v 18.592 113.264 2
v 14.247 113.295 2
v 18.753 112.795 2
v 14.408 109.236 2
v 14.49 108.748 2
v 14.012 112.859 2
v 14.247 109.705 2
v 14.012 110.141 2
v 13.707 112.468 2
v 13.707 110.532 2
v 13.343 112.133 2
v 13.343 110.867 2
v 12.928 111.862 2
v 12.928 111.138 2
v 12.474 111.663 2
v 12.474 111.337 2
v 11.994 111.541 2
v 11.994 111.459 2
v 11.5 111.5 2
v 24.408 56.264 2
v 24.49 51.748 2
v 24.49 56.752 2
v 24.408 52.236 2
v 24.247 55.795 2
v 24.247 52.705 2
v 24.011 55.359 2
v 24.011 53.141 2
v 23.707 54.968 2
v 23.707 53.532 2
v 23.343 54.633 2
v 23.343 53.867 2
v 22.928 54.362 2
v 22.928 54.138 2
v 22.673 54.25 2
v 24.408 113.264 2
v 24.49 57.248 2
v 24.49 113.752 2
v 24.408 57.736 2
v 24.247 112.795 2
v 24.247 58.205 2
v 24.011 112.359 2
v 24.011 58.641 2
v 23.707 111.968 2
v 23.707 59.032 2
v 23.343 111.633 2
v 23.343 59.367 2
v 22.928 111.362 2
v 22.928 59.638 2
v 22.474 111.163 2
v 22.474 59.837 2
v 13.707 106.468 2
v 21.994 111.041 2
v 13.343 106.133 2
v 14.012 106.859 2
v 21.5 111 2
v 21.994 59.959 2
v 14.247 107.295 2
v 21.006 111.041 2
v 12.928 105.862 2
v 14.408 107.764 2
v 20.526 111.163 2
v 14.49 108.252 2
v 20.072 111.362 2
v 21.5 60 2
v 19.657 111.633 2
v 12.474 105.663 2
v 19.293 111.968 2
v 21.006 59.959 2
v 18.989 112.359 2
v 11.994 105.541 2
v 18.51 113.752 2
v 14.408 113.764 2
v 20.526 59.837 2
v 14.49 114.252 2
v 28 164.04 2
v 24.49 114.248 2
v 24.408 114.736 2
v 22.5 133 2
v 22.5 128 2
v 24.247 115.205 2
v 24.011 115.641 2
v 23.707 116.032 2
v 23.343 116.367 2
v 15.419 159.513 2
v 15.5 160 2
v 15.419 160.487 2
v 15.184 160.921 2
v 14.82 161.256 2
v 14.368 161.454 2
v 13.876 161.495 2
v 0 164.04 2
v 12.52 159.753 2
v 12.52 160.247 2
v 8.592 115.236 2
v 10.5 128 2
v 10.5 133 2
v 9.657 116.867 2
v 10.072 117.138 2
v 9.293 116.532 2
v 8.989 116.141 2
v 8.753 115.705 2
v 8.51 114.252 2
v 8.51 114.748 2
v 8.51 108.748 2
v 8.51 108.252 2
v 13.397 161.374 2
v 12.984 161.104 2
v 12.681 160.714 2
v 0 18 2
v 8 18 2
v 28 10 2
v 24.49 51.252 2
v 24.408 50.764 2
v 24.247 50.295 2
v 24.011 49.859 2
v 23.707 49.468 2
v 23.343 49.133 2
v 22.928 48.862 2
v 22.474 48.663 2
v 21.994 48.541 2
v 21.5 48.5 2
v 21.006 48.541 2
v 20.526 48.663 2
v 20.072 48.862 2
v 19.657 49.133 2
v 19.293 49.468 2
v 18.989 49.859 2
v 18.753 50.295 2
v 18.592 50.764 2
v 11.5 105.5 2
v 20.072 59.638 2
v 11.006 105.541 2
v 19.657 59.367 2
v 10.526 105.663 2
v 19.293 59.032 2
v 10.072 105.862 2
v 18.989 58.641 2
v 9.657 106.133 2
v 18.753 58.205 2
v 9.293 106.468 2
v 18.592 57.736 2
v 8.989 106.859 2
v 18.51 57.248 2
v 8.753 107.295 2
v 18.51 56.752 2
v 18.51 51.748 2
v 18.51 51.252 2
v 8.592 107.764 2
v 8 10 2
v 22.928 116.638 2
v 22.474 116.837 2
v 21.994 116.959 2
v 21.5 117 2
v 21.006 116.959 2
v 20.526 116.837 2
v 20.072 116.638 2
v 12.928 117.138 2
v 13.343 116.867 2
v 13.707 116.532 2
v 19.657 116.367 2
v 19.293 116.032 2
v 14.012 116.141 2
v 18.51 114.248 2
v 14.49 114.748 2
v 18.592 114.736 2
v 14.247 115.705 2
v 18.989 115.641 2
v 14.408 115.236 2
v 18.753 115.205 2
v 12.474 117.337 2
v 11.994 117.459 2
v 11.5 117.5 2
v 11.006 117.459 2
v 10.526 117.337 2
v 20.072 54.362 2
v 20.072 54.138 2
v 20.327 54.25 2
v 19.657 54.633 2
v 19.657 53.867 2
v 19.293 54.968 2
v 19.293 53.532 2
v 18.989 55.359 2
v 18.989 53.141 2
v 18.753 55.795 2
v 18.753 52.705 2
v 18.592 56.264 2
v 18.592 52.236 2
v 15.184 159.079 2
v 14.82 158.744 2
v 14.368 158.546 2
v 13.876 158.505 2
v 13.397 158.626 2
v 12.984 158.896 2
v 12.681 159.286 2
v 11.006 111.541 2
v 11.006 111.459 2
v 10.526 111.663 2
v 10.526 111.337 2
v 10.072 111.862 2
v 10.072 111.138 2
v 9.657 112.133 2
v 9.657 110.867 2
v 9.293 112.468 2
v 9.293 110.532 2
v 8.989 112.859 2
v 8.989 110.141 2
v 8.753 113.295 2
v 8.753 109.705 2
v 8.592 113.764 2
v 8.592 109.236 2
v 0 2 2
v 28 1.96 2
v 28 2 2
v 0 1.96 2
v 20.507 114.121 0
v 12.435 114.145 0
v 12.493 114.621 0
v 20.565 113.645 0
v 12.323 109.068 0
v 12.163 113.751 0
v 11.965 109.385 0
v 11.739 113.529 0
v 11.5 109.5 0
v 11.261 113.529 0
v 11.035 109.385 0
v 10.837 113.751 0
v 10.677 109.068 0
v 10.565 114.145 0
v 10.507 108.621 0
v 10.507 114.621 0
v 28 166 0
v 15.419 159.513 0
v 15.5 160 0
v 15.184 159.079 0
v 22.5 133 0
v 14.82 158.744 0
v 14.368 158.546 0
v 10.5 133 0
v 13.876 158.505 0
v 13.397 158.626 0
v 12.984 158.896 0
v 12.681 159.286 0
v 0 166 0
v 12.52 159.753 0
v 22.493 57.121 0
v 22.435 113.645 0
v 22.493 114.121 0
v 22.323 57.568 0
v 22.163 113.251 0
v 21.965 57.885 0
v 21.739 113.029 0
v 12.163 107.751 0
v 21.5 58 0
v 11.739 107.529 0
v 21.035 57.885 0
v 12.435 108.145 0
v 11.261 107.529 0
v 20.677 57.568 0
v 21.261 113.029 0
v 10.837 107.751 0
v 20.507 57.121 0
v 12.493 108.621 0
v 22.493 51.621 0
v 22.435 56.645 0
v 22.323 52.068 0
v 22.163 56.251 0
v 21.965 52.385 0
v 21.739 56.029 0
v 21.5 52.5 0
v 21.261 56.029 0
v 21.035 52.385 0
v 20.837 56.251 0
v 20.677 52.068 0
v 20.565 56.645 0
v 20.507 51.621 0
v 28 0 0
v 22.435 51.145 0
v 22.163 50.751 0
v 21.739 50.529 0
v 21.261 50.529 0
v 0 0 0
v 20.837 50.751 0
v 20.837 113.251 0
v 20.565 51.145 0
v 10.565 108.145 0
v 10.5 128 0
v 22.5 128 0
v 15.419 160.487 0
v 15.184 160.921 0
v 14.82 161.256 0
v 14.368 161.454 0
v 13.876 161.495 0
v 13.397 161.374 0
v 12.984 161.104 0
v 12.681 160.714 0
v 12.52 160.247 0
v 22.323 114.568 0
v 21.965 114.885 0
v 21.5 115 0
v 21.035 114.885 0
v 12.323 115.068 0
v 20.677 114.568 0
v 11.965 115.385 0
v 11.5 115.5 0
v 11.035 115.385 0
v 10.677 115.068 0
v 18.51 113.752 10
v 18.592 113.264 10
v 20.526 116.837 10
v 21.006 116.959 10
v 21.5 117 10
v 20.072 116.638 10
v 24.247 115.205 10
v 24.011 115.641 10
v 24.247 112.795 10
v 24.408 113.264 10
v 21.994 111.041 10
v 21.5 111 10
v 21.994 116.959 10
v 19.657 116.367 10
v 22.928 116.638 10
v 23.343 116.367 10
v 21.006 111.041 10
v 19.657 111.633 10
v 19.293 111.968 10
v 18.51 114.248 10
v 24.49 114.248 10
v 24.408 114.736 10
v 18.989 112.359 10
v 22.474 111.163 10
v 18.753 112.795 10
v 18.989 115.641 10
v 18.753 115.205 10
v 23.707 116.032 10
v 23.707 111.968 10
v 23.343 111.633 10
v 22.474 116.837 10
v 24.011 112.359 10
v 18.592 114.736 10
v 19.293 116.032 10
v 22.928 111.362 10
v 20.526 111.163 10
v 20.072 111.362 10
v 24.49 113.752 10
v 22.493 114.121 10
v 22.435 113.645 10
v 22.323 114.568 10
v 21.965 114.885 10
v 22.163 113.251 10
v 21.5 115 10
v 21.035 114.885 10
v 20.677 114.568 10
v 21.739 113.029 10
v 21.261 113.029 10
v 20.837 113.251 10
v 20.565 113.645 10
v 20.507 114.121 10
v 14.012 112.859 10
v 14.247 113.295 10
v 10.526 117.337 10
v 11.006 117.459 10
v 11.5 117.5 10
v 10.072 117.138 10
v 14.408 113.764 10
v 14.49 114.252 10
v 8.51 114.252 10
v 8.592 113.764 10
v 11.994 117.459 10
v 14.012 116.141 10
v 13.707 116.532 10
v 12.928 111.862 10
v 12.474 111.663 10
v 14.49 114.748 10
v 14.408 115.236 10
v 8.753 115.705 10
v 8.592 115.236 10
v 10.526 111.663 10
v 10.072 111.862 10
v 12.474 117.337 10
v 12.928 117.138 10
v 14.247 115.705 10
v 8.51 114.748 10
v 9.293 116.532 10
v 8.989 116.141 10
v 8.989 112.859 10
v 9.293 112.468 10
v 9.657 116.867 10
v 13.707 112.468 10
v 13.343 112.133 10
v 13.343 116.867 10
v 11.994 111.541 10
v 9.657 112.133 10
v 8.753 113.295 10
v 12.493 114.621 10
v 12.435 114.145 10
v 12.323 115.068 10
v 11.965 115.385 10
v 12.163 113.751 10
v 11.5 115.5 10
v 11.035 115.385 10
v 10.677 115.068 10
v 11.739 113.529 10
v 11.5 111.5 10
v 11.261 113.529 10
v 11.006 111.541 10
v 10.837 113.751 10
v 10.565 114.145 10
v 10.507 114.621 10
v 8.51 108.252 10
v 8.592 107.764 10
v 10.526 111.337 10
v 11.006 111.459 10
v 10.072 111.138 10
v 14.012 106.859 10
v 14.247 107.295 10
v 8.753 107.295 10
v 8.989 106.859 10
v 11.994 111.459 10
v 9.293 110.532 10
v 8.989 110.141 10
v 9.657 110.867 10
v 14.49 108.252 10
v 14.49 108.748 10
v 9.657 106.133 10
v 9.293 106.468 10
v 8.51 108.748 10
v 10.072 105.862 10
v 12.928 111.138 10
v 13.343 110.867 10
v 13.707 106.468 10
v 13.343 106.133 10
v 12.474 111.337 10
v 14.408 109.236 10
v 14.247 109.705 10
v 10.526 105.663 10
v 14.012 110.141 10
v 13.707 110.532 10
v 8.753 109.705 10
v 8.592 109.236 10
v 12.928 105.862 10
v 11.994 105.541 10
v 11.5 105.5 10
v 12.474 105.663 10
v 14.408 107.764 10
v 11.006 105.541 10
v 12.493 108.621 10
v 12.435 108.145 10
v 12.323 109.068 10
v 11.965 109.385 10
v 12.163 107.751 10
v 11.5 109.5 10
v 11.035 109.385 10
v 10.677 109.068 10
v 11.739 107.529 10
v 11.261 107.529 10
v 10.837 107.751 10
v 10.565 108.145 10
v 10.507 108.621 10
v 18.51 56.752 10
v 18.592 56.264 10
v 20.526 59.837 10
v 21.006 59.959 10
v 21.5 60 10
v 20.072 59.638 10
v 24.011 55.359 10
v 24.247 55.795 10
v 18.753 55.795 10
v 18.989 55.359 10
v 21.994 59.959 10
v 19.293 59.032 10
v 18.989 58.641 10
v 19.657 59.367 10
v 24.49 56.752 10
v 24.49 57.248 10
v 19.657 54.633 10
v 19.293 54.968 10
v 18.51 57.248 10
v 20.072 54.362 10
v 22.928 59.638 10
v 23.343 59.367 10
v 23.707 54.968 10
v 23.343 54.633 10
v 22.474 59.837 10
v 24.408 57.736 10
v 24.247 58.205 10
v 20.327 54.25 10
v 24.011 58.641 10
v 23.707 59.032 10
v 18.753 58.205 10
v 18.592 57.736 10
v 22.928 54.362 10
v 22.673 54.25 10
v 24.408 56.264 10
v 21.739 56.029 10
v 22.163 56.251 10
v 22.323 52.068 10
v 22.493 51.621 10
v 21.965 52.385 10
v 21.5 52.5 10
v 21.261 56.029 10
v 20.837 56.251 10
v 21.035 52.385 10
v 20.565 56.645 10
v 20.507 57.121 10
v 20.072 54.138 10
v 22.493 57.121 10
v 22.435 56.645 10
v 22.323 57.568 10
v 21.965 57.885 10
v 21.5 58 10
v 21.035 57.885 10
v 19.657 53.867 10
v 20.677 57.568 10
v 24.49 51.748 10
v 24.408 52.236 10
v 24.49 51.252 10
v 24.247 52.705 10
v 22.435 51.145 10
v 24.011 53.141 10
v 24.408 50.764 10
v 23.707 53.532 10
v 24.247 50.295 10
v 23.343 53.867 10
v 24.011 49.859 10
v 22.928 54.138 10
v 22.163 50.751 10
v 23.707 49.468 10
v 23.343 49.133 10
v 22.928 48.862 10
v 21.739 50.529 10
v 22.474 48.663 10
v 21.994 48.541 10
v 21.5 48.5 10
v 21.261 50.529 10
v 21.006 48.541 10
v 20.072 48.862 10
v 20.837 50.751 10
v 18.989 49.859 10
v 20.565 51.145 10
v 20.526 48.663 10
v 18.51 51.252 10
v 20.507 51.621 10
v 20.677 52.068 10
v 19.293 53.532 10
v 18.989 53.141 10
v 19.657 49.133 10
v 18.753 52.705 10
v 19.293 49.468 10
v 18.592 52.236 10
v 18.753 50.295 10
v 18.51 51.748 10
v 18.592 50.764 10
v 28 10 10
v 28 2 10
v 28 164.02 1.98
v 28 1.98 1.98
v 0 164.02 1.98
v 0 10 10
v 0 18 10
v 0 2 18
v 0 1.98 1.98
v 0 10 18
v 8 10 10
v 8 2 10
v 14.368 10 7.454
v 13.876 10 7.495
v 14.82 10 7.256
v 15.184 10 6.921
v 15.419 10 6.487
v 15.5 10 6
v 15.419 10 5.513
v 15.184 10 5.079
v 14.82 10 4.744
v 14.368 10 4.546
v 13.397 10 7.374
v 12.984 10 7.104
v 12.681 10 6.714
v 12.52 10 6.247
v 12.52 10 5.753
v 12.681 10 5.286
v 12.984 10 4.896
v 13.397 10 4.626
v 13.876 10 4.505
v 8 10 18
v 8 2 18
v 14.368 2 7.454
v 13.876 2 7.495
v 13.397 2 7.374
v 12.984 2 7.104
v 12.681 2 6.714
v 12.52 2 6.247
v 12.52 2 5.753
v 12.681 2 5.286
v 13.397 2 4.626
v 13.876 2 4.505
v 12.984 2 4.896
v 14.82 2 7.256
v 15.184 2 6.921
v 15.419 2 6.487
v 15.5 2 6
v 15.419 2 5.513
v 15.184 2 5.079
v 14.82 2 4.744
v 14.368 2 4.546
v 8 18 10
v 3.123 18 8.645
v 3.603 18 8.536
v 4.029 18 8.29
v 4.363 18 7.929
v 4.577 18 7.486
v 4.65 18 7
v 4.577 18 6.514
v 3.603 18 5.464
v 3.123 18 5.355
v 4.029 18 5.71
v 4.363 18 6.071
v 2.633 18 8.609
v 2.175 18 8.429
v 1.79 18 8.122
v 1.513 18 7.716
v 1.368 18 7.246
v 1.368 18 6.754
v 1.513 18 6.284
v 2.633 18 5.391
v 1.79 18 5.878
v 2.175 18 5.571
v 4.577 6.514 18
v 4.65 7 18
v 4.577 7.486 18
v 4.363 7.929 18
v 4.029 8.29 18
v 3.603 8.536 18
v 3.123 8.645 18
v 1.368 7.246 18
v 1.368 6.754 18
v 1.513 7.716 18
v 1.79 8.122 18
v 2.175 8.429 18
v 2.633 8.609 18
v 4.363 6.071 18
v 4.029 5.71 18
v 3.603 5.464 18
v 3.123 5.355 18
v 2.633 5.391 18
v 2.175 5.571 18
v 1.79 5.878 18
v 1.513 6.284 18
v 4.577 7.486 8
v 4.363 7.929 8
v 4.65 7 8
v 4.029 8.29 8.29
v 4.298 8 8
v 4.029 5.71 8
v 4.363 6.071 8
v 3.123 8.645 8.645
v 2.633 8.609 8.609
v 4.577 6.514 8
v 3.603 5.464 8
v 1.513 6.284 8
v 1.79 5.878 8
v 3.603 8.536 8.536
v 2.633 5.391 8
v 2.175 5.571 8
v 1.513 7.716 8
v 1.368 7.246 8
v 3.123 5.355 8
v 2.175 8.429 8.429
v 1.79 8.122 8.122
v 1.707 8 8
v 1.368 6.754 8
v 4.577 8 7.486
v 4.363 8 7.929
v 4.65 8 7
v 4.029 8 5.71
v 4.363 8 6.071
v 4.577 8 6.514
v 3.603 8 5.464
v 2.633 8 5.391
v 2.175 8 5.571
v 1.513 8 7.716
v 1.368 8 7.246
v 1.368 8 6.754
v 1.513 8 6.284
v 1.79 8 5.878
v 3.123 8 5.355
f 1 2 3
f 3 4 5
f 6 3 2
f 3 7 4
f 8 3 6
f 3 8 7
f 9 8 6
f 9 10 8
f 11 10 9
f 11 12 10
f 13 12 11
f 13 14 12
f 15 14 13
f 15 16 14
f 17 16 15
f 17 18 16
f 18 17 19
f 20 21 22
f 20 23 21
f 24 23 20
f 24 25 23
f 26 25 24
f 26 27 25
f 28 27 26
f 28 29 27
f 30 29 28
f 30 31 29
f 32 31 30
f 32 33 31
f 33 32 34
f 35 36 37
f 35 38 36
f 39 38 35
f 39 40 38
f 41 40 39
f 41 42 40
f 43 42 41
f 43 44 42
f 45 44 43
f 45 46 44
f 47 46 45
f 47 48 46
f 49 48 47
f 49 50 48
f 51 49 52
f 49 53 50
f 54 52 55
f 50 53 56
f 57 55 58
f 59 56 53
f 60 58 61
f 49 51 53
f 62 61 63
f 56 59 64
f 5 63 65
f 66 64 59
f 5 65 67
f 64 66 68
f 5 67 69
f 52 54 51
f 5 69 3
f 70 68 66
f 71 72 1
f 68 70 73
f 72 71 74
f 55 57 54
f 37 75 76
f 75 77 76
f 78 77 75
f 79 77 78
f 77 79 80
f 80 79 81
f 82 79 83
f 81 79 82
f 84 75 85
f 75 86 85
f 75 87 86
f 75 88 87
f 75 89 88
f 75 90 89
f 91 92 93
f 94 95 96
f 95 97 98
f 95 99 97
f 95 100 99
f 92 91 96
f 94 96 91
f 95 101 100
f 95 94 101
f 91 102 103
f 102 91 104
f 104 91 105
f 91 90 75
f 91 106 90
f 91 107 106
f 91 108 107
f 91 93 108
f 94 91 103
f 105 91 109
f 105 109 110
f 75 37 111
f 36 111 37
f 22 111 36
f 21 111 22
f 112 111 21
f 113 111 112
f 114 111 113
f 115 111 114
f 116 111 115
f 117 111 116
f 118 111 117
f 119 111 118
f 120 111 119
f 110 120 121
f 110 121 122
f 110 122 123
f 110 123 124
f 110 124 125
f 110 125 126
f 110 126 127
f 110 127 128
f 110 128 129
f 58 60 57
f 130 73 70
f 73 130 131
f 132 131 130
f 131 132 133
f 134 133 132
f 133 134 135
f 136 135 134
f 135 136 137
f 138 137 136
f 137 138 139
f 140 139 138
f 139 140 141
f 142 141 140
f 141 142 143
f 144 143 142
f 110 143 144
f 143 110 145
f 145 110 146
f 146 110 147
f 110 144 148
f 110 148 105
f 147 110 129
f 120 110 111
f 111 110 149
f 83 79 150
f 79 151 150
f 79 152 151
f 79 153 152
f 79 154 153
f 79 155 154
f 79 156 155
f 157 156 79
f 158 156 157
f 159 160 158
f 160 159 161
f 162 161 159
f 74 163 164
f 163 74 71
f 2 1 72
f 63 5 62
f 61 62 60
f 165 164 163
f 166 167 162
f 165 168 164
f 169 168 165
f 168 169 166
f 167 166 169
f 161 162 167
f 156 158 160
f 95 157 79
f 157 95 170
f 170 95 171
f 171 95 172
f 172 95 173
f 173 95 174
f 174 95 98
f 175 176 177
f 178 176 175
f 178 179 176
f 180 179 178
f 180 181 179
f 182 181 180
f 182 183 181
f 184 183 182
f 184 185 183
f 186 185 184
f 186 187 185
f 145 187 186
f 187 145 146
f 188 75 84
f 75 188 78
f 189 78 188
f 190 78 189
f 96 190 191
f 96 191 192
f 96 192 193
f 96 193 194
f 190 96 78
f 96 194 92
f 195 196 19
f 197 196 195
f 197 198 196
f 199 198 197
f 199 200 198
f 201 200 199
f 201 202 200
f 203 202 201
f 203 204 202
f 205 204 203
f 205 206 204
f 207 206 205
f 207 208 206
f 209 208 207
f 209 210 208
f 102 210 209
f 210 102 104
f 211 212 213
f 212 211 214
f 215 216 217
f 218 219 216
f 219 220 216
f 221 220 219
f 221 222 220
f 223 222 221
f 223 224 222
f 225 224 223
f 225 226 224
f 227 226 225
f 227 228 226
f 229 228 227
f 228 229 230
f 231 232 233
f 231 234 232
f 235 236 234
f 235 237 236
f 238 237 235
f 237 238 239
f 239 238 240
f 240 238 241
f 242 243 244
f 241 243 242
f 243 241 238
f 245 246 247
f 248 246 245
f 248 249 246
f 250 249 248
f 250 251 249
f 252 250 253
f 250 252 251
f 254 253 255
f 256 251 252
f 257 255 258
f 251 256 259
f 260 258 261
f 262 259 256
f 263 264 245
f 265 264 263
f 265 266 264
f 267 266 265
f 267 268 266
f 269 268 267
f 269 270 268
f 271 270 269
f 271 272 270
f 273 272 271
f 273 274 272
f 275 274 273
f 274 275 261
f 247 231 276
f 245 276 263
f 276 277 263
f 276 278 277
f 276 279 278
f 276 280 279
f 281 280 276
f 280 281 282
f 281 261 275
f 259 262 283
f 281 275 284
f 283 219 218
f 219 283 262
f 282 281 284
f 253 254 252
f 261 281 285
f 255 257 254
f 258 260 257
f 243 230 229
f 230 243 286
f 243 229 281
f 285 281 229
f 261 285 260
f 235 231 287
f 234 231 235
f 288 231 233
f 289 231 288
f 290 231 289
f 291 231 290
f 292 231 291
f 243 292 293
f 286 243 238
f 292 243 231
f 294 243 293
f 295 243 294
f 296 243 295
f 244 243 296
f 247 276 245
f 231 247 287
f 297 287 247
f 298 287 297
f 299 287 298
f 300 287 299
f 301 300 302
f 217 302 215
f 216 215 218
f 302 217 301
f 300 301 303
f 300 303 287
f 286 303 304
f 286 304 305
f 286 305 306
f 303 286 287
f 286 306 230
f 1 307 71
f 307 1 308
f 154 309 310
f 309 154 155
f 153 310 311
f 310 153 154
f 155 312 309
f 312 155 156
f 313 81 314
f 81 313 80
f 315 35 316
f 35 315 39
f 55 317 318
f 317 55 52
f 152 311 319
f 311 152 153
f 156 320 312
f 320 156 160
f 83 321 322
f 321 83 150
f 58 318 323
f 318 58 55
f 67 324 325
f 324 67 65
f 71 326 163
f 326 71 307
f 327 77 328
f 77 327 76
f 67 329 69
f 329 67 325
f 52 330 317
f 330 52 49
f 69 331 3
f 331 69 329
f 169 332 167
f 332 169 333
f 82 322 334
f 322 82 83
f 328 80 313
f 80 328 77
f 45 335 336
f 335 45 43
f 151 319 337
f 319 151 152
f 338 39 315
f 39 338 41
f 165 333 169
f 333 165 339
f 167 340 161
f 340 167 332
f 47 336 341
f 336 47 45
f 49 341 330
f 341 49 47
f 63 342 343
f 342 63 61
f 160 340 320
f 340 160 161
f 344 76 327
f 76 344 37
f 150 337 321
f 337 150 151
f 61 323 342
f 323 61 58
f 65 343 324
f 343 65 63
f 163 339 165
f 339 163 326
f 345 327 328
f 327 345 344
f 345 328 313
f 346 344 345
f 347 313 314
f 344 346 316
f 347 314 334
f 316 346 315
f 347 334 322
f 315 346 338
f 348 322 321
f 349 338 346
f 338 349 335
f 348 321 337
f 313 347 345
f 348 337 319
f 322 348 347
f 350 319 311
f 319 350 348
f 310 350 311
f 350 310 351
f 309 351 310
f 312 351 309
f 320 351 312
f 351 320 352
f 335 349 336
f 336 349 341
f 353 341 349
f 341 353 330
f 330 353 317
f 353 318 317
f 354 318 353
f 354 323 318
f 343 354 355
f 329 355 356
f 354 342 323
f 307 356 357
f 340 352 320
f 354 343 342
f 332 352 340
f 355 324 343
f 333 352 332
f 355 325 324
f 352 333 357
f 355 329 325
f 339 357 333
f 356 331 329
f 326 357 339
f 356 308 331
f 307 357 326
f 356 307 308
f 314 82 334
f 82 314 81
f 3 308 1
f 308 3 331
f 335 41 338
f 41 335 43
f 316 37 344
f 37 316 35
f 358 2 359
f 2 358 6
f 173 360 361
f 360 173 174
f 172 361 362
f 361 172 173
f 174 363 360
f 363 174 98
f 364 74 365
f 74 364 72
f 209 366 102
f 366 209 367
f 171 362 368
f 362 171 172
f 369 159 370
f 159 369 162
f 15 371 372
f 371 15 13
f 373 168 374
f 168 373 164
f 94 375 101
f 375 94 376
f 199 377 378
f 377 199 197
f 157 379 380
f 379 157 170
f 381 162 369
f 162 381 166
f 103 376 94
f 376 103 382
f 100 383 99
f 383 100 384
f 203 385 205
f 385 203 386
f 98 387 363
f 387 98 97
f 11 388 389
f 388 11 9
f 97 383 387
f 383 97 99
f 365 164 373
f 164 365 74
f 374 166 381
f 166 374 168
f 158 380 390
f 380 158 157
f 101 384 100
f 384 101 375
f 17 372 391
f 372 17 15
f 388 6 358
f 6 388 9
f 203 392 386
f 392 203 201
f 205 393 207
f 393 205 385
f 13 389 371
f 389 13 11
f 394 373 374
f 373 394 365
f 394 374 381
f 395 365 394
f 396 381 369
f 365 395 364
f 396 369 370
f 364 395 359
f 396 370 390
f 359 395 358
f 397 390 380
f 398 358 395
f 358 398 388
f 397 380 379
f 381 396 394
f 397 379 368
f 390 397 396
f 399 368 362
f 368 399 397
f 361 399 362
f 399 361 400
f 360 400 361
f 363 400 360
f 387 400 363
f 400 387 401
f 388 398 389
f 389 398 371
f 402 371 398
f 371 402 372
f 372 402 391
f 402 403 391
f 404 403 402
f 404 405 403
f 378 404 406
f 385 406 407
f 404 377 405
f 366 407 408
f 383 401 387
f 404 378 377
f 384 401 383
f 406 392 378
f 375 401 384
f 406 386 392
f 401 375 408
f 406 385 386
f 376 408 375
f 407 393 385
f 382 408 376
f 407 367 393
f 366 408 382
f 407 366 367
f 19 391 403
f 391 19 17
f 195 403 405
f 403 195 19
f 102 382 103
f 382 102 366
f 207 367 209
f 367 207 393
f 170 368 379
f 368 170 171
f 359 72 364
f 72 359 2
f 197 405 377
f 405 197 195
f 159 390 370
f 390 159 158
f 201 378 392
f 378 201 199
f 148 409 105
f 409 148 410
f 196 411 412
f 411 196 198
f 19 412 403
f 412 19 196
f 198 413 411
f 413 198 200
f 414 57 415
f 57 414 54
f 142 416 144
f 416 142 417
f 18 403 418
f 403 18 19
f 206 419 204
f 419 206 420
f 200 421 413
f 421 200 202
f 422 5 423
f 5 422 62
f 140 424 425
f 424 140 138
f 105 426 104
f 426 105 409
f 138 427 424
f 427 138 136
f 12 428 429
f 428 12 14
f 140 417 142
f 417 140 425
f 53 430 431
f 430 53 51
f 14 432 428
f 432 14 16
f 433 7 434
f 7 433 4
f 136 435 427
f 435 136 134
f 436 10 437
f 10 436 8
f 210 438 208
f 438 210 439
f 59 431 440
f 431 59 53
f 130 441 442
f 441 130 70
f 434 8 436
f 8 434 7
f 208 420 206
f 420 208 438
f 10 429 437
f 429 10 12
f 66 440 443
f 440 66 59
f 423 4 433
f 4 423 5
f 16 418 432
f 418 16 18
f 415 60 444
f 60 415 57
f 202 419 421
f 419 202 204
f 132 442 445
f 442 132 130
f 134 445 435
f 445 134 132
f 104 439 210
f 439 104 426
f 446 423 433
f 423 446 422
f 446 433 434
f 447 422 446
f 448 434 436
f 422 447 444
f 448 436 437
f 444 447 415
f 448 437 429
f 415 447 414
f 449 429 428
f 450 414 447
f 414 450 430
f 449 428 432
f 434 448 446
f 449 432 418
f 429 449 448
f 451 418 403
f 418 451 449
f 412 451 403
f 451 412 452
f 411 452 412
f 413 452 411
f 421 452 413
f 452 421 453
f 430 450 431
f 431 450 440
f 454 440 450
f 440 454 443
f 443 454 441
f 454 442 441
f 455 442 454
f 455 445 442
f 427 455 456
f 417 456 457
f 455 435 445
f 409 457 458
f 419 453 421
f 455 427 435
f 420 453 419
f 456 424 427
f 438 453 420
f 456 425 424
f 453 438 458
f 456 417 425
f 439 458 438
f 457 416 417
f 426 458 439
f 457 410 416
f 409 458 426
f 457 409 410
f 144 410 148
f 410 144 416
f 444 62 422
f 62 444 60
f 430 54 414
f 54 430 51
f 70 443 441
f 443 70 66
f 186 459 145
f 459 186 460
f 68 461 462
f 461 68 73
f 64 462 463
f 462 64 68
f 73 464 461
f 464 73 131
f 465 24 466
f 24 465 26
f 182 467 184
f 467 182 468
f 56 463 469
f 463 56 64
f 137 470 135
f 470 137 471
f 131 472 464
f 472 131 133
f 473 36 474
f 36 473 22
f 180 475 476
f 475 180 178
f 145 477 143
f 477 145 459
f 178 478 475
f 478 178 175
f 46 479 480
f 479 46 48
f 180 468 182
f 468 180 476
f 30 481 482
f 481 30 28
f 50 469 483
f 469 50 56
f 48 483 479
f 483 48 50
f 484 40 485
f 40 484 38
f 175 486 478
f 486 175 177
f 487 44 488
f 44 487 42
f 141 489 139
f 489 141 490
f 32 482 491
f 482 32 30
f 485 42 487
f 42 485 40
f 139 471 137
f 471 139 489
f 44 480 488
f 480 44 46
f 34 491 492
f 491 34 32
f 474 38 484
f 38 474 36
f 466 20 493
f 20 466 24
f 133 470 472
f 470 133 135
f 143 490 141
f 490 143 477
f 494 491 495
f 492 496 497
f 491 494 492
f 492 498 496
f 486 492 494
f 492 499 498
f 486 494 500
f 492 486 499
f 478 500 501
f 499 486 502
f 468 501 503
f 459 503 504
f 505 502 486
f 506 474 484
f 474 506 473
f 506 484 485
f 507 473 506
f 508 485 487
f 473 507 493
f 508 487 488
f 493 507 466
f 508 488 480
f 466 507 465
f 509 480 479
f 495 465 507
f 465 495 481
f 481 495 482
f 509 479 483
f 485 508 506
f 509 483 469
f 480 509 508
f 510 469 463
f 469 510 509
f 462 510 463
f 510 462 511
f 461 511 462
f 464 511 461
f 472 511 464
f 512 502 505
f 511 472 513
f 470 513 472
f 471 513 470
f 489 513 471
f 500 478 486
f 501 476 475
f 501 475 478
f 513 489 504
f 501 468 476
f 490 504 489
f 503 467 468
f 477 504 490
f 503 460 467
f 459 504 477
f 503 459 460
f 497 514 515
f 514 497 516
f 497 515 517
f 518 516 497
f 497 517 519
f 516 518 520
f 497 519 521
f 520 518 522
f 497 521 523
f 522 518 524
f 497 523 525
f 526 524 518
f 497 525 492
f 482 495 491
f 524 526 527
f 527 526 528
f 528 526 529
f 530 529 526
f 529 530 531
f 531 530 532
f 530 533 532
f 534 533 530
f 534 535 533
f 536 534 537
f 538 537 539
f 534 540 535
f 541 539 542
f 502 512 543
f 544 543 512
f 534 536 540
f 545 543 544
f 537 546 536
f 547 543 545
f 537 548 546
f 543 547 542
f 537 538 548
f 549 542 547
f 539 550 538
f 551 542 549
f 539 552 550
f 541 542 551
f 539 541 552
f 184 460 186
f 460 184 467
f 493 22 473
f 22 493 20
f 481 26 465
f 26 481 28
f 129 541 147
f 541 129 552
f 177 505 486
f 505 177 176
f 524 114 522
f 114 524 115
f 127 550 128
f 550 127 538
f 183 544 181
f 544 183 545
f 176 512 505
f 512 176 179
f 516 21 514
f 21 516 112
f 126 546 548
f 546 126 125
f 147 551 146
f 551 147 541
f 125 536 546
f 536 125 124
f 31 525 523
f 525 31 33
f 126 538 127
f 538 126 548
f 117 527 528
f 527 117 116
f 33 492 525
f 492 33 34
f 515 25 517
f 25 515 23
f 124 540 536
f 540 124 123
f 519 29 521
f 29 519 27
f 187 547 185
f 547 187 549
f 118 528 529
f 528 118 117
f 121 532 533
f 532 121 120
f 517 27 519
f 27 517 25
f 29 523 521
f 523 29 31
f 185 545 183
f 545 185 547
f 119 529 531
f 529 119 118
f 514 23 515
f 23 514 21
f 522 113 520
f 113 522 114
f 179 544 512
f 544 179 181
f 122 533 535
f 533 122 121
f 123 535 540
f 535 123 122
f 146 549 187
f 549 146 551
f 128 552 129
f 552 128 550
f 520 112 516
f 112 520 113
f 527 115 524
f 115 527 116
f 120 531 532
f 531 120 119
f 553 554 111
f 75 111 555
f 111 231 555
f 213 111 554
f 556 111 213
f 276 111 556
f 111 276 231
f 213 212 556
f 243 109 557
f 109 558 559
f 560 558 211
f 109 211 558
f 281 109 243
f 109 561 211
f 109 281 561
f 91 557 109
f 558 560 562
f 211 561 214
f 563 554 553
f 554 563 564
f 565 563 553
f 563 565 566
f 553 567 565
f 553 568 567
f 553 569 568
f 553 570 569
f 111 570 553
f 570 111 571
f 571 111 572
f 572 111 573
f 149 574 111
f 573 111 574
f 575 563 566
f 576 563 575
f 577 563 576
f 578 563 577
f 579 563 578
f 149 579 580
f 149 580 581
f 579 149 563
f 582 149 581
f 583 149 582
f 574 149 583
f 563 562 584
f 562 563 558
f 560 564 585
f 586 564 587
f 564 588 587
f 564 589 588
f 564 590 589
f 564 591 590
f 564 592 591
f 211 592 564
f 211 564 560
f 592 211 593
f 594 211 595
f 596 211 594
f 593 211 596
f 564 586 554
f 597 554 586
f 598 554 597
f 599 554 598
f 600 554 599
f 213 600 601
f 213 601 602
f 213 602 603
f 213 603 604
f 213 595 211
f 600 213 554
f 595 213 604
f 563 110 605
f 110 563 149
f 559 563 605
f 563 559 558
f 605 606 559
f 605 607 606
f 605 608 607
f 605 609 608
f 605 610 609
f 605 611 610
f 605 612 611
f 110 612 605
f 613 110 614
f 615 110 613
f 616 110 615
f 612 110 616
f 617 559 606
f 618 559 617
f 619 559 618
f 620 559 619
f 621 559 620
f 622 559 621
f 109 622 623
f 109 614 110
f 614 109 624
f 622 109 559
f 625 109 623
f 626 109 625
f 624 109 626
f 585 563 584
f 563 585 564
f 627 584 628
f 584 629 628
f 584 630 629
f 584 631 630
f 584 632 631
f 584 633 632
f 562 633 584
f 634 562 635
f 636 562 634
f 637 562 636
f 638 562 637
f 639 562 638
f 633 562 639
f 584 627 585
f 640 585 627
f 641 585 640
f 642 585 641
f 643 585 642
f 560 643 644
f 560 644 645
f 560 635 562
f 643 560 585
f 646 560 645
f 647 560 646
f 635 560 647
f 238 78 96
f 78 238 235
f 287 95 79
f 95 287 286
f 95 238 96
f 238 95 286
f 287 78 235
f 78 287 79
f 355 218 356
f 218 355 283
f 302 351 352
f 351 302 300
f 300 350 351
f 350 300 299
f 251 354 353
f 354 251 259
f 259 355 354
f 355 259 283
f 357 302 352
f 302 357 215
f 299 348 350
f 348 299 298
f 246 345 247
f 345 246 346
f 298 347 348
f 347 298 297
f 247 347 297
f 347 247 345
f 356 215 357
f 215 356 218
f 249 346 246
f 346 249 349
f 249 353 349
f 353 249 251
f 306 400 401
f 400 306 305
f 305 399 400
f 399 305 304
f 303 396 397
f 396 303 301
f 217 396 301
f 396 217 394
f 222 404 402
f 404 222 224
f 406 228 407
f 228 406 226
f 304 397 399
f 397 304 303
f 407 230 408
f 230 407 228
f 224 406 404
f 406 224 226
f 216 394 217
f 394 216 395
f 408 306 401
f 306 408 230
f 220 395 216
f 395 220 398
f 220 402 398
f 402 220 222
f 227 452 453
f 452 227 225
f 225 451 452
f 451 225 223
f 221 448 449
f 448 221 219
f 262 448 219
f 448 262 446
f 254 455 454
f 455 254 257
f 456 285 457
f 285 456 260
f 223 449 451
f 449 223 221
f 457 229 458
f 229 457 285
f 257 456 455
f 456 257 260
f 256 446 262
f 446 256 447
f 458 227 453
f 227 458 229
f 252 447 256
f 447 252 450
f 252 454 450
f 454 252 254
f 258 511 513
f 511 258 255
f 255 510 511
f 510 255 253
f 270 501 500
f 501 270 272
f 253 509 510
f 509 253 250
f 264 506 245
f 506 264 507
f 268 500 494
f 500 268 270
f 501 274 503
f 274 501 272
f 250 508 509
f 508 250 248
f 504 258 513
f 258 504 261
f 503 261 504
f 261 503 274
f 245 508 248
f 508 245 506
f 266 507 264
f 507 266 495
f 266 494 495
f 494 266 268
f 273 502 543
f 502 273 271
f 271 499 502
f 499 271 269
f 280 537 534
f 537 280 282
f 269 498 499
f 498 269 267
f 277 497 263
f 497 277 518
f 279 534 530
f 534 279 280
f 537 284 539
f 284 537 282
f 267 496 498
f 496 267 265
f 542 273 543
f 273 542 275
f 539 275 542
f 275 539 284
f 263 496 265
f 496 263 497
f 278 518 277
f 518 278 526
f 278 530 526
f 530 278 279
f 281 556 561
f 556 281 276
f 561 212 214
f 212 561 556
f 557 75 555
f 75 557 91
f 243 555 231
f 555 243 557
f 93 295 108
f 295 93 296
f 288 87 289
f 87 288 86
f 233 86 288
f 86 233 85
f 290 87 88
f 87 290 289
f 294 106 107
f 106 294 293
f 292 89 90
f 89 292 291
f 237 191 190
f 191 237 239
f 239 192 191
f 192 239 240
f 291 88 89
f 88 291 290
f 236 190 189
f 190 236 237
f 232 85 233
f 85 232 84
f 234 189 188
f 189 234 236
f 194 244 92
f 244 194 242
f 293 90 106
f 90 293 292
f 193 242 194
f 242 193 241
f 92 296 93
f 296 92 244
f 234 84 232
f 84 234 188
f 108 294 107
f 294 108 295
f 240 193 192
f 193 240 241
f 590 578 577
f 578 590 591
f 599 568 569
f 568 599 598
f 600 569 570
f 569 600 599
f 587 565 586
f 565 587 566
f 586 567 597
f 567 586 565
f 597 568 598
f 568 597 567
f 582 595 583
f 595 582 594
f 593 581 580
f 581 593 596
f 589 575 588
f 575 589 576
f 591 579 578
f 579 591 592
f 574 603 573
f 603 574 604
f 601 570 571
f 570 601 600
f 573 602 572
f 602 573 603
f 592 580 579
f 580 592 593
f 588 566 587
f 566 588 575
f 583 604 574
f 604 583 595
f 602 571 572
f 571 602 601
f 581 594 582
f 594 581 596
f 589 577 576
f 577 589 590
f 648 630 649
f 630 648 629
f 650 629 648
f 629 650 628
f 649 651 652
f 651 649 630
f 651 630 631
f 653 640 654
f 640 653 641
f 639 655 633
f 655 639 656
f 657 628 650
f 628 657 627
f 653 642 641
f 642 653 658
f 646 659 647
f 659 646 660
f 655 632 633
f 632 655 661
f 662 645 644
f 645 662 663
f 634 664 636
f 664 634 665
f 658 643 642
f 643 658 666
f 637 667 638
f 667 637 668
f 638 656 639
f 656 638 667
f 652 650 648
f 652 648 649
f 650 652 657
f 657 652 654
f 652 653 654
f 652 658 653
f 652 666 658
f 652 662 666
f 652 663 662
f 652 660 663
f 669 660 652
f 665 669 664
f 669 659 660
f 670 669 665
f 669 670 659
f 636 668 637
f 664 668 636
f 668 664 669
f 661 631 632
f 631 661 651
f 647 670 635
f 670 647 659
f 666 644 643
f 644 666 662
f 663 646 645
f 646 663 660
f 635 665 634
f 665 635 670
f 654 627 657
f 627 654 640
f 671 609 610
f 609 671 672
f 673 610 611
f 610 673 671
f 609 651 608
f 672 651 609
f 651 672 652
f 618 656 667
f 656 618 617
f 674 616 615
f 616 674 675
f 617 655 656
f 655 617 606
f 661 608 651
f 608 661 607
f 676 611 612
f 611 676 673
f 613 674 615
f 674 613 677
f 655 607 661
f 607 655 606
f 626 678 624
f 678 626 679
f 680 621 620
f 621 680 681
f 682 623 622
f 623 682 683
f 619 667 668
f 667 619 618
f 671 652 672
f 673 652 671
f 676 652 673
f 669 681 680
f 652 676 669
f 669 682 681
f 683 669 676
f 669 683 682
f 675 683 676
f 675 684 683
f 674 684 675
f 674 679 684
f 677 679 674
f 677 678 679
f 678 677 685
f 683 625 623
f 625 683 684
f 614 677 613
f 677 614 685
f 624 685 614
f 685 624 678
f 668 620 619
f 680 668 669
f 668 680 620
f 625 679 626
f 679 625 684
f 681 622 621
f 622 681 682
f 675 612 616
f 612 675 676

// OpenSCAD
// based on https://www.davidpilling.com/wiki/index.php/XYP

//Disable $fn and $fa, do not change these
$fn=0;
$fa=0.01;
$fs=0.5;

motorthrow=61;
bearingdistance=80;



//basey=motorthrow+bearingdistance;

baset=2;
basemidx=28;

basecornery=8;
basecornert=8;
basecornerfromtop=3;
basecornerfromside=5;


basey=150+basecornery*2;

raild=3.3;

boltd=3;


motorshift=52;

motorsupportd=6;
motorsupporth=10;   
motorholed=2;
motorholeh=10;   


module motorbase(sd,sh)
{
 
 translate([14,-1,0])cube([5,12,baset]);
    
 cylinder(d=sd,h=sh);
 translate([0.5,10,0])cylinder(d=sd,h=sh);    
 translate([-5-0.5,10,0])cylinder(d=sd,h=sh);    
    
 translate([-57,0,0])cylinder(d=sd,h=sh);    
    
 translate([-57-5-0.5,0,0])cylinder(d=sd,h=sh);    

}











module motorbasemaker()
{
union()
{
    
 difference()
 {
  union()
  {
   cube([basemidx,basey,baset]);
      
   translate([0,baset,baset])cube([basemidx,basecornery,basecornert]);
      
   translate([0,baset+basecornery,baset])cube([basecornert,basecornery,basecornert]);
      
   translate([0,baset,baset+basecornery])cube([basecornert,basecornery,basecornert]);
      

   translate([basemidx-8+1.5,basey-motorshift,0])rotate([0,0,90])motorbase(motorsupportd,motorsupporth);
  }
  
  translate([basemidx-8+1.5,basey-motorshift,0])rotate([0,0,90])motorbase(motorholed,motorholeh);


// chamfer
  
  rotate([45,0,0])cube([basemidx,1.4*baset,1.4*baset]);
  
  translate([0,basey,0])rotate([45,0,0])cube([basemidx,1.4*baset,1.4*baset]);  
  
// hole to hold together  
  
  translate([basemidx/2,basey-baset-basecornery/2,0])cylinder(h=baset+basecornery,d=boltd);
  

  translate([basemidx/2,baset+basecornery,baset+basecornery/2])rotate([90,0,0])cylinder(h=baset+basecornery,d=boltd);

// rail holes

   translate([basecornerfromtop,basecornerfromside+baset,basecornery])cylinder(d=raild,h=basecornery+baset);

   translate([basecornerfromtop,2*basecornery+baset,basecornerfromside+baset])rotate([90,0,0])cylinder(d=raild,h=basecornery+baset);


  
 }
}
}

motorbasemaker();
